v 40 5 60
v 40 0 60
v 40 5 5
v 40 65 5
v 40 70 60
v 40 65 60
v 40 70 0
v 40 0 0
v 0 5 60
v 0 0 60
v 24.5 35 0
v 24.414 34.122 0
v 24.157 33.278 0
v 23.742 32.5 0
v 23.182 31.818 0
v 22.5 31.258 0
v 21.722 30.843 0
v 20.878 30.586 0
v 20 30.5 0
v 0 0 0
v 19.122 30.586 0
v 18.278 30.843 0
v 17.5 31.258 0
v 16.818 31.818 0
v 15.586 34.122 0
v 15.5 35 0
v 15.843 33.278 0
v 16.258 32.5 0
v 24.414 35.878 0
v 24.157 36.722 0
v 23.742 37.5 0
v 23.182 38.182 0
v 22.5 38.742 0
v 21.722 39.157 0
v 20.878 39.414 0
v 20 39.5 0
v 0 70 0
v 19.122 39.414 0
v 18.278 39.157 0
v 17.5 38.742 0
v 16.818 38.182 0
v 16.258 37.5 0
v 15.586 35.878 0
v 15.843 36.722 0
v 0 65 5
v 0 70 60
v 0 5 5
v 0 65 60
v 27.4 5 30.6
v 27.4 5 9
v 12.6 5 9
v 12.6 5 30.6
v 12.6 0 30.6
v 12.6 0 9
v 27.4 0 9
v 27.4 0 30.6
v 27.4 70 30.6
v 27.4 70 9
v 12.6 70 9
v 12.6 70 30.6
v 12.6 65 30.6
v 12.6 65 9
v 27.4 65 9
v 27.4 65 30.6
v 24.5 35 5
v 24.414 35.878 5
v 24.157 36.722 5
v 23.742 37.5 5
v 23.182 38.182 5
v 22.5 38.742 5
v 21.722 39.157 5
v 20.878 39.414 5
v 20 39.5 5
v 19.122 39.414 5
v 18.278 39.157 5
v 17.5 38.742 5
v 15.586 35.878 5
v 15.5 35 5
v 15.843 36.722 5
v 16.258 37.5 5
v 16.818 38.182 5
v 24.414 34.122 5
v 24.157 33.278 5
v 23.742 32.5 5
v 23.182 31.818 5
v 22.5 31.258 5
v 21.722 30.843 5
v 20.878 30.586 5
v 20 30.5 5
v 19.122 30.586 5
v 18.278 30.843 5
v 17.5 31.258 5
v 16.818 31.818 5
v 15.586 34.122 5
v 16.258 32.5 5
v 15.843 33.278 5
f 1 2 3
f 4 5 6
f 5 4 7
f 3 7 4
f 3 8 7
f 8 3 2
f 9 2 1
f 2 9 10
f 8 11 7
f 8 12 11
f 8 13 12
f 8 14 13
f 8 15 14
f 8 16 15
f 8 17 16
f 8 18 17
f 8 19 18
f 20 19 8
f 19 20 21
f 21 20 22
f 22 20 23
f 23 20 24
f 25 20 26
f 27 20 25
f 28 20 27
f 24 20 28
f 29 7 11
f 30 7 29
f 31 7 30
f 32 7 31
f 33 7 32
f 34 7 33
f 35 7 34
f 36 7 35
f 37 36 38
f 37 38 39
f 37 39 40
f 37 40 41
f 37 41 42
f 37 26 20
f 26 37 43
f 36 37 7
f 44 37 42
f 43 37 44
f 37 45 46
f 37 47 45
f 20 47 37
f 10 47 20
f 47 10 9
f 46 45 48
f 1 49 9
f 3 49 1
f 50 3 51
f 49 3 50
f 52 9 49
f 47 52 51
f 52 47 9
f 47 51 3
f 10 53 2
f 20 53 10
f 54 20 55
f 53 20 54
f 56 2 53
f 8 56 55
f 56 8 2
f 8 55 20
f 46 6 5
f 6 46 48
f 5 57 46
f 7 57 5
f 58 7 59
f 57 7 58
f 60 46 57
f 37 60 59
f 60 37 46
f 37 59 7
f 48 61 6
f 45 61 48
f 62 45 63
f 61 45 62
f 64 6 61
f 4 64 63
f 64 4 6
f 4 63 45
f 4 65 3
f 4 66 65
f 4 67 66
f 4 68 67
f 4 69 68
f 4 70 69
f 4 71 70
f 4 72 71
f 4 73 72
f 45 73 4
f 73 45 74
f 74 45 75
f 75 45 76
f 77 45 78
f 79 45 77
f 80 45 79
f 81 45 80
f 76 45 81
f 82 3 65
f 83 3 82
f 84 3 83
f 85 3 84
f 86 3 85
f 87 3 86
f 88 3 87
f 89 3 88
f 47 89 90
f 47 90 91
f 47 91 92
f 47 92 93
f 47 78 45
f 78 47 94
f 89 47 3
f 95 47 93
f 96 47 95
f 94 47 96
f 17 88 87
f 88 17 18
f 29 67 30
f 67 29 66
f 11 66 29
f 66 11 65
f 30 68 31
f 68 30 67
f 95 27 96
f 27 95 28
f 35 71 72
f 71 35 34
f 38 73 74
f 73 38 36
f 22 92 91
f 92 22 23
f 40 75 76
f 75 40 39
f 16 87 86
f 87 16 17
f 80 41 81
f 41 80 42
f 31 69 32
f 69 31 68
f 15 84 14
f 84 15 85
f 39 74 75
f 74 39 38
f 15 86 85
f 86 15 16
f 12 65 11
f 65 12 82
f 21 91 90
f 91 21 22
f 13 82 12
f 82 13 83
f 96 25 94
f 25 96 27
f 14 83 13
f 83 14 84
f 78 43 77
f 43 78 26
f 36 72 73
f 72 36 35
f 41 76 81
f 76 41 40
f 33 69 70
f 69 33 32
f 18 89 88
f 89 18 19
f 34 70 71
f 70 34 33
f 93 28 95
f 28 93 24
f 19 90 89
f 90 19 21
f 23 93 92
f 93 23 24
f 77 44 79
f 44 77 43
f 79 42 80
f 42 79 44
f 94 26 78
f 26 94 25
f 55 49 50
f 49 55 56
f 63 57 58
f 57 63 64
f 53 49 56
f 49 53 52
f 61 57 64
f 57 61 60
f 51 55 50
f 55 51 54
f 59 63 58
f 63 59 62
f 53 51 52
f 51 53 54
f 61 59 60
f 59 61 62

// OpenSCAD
$fn = 32;

// ----------------------------------------------------------------------
// U-bracket: 40 x 70 x 60 mm
// ----------------------------------------------------------------------

// --- parameters (mm) ---
base_len = 40;            // outer length, X
channel_w = 70;           // outer width, Y
upright_h = 60;           // upright height, Z
mat_t = 5;                // wall thickness
hole_d = 9;               // clearance for M8
window_l = 14.8;          // window length
window_h = 21.6;          // window height

module hole_z(px, py) {
  translate([px, py, -0.5]) cylinder(h = mat_t + 1, d = hole_d);
}
module hole_y_pz(pz) {
  /* through both uprights along Y */
  translate([0, -0.5, pz]) rotate([-90, 0, 0]) cylinder(h = channel_w + 1, d = hole_d);
}

module base() {
  cube([base_len, channel_w, mat_t]);
}

module uprights() {
  cube([base_len, mat_t, upright_h]);
  translate([0, channel_w - mat_t, 0]) cube([base_len, mat_t, upright_h]);
}

difference() {
  union() {
    base();
    uprights();
  }
  hole_z(20, 35);
  /* lightening window through both uprights */
  translate([base_len / 2 - window_l / 2, -1, mat_t + 4])
    cube([window_l, channel_w + 2, window_h]);
}
